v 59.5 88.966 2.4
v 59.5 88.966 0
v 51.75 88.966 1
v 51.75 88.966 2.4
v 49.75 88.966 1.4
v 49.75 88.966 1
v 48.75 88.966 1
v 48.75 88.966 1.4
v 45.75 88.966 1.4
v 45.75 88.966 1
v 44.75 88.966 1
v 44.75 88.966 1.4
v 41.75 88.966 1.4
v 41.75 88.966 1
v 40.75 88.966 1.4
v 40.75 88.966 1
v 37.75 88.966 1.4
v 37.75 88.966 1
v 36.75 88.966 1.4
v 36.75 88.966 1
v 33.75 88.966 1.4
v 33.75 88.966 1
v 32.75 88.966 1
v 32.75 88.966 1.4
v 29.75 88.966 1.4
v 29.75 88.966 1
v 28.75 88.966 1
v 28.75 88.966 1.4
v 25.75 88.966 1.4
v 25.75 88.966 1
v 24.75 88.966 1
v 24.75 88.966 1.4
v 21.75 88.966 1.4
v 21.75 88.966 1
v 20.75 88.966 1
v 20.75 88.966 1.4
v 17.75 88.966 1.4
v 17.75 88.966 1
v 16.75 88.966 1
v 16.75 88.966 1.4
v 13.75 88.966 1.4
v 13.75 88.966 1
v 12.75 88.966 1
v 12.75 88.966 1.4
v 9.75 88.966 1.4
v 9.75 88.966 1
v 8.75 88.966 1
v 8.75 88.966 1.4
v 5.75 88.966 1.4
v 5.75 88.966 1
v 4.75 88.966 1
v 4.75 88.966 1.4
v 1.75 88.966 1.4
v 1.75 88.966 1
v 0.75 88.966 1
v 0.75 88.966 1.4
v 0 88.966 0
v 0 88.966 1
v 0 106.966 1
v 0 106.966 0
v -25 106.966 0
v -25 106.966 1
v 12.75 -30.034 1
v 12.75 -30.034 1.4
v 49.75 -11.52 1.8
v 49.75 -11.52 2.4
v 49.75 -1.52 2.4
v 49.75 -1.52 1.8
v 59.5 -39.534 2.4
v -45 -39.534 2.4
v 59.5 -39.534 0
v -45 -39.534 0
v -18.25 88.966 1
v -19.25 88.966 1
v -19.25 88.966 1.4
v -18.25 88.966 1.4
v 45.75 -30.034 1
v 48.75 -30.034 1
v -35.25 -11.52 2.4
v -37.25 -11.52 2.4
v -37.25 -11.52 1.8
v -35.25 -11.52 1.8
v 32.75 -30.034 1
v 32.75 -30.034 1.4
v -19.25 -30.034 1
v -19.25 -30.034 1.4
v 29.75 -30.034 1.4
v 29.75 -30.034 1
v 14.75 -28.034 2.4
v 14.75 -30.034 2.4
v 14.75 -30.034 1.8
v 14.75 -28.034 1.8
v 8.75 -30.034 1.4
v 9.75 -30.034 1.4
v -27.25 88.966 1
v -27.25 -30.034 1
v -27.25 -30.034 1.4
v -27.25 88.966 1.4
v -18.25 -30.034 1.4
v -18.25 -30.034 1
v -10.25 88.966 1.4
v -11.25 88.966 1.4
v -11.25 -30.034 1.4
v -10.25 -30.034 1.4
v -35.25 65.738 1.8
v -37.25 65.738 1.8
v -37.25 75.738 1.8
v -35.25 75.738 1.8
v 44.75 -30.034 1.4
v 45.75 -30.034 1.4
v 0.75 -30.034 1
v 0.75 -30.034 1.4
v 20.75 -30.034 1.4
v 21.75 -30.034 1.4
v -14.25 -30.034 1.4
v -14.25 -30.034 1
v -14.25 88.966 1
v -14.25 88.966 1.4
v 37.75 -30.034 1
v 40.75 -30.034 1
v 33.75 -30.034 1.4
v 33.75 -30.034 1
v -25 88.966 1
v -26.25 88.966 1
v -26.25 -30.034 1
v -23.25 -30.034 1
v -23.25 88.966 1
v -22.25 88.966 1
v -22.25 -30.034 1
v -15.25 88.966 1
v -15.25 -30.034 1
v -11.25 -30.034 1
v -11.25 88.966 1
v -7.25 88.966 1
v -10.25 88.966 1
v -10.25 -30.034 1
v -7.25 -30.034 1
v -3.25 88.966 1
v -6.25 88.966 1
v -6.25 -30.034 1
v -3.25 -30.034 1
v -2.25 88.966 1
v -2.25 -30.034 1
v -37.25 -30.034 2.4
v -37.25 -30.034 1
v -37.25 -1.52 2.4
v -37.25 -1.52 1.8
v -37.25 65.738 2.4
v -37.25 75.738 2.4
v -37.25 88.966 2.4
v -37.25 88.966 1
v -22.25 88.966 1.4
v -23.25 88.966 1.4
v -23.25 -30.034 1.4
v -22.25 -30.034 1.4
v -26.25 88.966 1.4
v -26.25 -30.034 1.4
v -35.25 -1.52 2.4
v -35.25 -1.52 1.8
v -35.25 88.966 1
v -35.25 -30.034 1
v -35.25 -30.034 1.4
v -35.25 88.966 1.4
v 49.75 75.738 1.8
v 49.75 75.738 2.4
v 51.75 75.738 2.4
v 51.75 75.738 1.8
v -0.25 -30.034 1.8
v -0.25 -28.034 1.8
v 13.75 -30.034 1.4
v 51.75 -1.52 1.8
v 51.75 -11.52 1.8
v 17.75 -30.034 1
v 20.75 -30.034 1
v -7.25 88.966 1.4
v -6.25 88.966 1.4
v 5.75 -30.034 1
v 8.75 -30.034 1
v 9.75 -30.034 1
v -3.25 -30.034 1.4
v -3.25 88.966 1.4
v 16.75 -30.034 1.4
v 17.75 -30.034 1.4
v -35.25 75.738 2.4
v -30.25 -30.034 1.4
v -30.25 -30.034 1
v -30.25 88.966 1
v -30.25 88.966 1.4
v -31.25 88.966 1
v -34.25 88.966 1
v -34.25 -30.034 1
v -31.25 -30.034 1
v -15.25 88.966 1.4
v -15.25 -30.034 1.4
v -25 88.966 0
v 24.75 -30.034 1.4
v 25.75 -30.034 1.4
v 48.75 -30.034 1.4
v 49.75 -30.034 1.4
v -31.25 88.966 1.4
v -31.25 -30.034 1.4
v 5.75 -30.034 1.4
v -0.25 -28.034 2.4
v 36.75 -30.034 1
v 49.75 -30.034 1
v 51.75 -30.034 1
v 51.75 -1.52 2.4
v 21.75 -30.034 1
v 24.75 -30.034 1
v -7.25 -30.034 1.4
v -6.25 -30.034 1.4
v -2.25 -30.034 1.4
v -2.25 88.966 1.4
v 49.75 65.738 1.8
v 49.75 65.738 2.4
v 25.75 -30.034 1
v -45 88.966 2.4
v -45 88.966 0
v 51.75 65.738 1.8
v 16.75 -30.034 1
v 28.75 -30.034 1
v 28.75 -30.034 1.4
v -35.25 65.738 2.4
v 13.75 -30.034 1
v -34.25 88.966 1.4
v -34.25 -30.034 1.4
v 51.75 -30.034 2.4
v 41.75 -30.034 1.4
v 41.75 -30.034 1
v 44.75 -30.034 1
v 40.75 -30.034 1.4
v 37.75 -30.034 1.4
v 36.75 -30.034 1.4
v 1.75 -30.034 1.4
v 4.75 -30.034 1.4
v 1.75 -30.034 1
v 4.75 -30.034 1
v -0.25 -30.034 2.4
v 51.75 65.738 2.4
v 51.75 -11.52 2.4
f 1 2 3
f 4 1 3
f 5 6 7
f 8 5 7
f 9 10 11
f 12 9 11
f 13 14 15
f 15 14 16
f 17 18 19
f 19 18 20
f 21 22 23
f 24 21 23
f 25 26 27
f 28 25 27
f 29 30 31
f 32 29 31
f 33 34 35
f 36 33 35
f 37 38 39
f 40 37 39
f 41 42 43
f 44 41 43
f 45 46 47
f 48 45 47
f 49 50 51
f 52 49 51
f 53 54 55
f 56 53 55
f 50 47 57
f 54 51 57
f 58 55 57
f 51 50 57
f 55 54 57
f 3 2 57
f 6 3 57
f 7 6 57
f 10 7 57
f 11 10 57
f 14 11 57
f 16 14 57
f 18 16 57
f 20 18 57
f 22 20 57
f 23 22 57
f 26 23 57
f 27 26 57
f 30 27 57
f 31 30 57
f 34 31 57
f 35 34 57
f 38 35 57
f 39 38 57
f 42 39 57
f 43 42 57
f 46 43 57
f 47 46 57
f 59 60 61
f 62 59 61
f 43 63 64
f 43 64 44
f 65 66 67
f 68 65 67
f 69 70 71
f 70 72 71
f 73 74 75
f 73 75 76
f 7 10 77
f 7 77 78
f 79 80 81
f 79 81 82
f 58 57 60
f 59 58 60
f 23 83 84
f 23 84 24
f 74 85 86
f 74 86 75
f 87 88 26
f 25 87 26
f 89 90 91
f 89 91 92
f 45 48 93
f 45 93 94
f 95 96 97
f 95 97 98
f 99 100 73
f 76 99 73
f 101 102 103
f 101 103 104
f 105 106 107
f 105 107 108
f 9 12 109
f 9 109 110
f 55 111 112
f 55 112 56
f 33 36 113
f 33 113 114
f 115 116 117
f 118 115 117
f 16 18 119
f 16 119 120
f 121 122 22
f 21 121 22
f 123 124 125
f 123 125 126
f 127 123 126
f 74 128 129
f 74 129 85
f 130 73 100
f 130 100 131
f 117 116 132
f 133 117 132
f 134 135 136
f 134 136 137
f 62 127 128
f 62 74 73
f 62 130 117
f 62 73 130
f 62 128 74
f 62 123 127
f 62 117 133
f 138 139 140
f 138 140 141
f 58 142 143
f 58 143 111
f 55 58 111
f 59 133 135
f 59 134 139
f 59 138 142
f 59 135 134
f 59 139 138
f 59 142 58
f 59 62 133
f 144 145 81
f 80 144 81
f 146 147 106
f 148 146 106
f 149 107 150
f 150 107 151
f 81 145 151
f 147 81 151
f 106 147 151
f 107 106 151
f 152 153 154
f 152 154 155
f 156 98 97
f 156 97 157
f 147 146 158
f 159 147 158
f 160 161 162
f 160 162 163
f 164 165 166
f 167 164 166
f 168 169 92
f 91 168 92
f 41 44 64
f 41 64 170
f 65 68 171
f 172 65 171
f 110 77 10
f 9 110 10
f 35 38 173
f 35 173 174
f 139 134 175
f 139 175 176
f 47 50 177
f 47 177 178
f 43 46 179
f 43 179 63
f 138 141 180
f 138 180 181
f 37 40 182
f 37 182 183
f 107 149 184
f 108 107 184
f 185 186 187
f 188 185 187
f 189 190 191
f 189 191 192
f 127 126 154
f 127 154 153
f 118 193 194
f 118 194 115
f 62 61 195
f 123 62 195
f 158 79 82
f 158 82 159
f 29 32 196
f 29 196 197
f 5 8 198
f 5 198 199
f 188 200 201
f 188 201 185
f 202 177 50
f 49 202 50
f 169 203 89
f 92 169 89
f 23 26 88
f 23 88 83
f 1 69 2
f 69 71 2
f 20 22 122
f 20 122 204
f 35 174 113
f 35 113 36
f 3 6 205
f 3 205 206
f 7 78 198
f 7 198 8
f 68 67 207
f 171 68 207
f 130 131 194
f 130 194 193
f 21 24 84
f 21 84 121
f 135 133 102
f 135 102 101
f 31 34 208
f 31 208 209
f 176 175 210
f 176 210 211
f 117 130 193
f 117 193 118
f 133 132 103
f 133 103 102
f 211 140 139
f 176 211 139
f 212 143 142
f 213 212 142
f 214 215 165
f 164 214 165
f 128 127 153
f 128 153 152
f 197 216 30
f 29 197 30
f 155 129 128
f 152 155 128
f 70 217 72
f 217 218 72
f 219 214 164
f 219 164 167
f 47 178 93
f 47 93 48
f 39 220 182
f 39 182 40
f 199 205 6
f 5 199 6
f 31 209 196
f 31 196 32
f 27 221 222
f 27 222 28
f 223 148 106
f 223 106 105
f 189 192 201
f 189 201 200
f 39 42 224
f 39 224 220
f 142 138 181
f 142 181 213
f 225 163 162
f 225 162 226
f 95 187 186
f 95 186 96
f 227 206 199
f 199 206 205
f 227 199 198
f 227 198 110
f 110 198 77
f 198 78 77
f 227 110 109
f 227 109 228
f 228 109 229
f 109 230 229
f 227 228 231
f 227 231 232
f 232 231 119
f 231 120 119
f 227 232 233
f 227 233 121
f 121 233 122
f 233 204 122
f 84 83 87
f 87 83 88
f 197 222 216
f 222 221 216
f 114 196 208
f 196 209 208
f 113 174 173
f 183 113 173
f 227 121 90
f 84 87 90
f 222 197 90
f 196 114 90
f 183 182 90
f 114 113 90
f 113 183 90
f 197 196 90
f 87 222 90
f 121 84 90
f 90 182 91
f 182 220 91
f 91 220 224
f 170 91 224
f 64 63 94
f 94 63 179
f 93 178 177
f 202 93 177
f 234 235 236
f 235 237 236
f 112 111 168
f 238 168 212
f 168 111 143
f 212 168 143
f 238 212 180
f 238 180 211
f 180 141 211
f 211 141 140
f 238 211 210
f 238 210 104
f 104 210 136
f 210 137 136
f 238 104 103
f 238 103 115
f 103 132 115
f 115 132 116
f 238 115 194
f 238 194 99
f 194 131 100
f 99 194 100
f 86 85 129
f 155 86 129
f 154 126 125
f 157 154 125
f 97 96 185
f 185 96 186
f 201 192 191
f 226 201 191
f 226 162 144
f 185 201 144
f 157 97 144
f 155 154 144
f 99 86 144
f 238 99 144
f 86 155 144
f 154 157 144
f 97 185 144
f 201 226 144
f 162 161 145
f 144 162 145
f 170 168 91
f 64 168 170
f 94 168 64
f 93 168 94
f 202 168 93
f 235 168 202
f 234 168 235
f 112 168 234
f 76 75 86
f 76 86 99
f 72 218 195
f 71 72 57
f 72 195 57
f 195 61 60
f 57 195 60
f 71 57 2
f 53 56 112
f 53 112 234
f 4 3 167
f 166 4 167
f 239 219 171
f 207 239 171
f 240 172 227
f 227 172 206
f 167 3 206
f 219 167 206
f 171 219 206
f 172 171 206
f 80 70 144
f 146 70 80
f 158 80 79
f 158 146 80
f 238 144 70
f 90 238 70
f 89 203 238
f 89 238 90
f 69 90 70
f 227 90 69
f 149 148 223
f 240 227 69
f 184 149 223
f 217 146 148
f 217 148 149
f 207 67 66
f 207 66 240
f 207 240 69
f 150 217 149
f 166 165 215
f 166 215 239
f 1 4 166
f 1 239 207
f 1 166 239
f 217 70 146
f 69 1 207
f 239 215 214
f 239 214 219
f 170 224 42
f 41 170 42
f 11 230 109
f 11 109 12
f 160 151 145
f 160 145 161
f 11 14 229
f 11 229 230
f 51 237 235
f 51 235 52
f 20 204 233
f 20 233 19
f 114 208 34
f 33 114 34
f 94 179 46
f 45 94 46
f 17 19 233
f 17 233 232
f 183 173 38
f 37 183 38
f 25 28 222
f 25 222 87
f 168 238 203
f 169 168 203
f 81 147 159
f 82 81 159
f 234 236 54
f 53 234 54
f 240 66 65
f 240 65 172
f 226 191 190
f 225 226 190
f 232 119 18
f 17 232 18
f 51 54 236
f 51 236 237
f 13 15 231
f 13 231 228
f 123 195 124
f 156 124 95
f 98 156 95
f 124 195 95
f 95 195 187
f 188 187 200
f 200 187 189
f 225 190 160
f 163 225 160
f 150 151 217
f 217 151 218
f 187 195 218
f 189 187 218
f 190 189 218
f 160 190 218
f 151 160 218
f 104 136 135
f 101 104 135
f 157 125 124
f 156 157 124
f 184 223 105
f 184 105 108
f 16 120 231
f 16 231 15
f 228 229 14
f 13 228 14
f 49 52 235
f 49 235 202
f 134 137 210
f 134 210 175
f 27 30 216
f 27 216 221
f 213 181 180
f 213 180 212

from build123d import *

# Parameters (mm, degrees)
F1_DEPTH = 1
F3_DEPTH = 1.4
F4_W     = 2
F4_H     = 10
F4_W_2   = 15
F4_H_2   = 2
F5_DEPTH = 0.6
F6_W     = 1
F6_H     = 119
F7_DEPTH = 0.4


with BuildPart() as f1:
    # F0 (on Top) → F1 (new body)
    with BuildSketch(Plane.XY):
        Polygon((-25, 88.965908), (-45, 88.965908), (-45, -39.534092), (59.5, -39.534092), (59.5, 88.965908), (0, 88.965908), (0, 106.965908), (-25, 106.965908), align=None)
    extrude(amount=F1_DEPTH)

    # F2 (on face) → F3 (join)
    with BuildSketch(Plane.XY.offset(1)):
        Polygon((-37.25, -30.034092), (-37.25, 88.965908), (-45, 88.965908), (-45, -39.534092), (59.5, -39.534092), (59.5, 88.965908), (51.75, 88.965908), (51.75, -30.034092), align=None)
    extrude(amount=F3_DEPTH)

    # F4 (on face) → F5 (join)
    with BuildSketch(Plane.XY.offset(2.4)):
        with Locations((50.75, 70.738149)):
            Rectangle(F4_W, F4_H)
        with Locations((50.75, -6.520228)):
            Rectangle(F4_W, F4_H)
        with Locations((7.25, -29.034092)):
            Rectangle(F4_W_2, F4_H_2)
        with Locations((-36.250001, -6.520228)):
            Rectangle(F4_W, F4_H)
        with Locations((-36.25, 70.738149)):
            Rectangle(F4_W, F4_H)
    extrude(amount=-F5_DEPTH)

    # F6 (on face) → F7 (join)
    with BuildSketch(Plane.XY.offset(1)):
        with Locations((-34.75, 29.465908)):
            Rectangle(F6_W, F6_H)
        with Locations((-30.75, 29.465908)):
            Rectangle(F6_W, F6_H)
        with Locations((-26.75, 29.465908)):
            Rectangle(F6_W, F6_H)
        with Locations((-22.75, 29.465908)):
            Rectangle(F6_W, F6_H)
        with Locations((-18.75, 29.465908)):
            Rectangle(F6_W, F6_H)
        with Locations((-14.75, 29.465908)):
            Rectangle(F6_W, F6_H)
        with Locations((-10.75, 29.465908)):
            Rectangle(F6_W, F6_H)
        with Locations((-6.75, 29.465908)):
            Rectangle(F6_W, F6_H)
        with Locations((-2.75, 29.465908)):
            Rectangle(F6_W, F6_H)
        with Locations((1.25, 29.465908)):
            Rectangle(F6_W, F6_H)
        with Locations((5.25, 29.465908)):
            Rectangle(F6_W, F6_H)
        with Locations((9.25, 29.465908)):
            Rectangle(F6_W, F6_H)
        with Locations((13.25, 29.465908)):
            Rectangle(F6_W, F6_H)
        with Locations((17.25, 29.465908)):
            Rectangle(F6_W, F6_H)
        with Locations((21.25, 29.465908)):
            Rectangle(F6_W, F6_H)
        with Locations((25.25, 29.465908)):
            Rectangle(F6_W, F6_H)
        with Locations((29.25, 29.465908)):
            Rectangle(F6_W, F6_H)
        with Locations((33.25, 29.465908)):
            Rectangle(F6_W, F6_H)
        with Locations((37.25, 29.465908)):
            Rectangle(F6_W, F6_H)
        with Locations((41.25, 29.465908)):
            Rectangle(F6_W, F6_H)
        with Locations((49.25, 29.465908)):
            Rectangle(F6_W, F6_H)
        with Locations((45.25, 29.465908)):
            Rectangle(F6_W, F6_H)
    extrude(amount=F7_DEPTH)


solid = f1.part
